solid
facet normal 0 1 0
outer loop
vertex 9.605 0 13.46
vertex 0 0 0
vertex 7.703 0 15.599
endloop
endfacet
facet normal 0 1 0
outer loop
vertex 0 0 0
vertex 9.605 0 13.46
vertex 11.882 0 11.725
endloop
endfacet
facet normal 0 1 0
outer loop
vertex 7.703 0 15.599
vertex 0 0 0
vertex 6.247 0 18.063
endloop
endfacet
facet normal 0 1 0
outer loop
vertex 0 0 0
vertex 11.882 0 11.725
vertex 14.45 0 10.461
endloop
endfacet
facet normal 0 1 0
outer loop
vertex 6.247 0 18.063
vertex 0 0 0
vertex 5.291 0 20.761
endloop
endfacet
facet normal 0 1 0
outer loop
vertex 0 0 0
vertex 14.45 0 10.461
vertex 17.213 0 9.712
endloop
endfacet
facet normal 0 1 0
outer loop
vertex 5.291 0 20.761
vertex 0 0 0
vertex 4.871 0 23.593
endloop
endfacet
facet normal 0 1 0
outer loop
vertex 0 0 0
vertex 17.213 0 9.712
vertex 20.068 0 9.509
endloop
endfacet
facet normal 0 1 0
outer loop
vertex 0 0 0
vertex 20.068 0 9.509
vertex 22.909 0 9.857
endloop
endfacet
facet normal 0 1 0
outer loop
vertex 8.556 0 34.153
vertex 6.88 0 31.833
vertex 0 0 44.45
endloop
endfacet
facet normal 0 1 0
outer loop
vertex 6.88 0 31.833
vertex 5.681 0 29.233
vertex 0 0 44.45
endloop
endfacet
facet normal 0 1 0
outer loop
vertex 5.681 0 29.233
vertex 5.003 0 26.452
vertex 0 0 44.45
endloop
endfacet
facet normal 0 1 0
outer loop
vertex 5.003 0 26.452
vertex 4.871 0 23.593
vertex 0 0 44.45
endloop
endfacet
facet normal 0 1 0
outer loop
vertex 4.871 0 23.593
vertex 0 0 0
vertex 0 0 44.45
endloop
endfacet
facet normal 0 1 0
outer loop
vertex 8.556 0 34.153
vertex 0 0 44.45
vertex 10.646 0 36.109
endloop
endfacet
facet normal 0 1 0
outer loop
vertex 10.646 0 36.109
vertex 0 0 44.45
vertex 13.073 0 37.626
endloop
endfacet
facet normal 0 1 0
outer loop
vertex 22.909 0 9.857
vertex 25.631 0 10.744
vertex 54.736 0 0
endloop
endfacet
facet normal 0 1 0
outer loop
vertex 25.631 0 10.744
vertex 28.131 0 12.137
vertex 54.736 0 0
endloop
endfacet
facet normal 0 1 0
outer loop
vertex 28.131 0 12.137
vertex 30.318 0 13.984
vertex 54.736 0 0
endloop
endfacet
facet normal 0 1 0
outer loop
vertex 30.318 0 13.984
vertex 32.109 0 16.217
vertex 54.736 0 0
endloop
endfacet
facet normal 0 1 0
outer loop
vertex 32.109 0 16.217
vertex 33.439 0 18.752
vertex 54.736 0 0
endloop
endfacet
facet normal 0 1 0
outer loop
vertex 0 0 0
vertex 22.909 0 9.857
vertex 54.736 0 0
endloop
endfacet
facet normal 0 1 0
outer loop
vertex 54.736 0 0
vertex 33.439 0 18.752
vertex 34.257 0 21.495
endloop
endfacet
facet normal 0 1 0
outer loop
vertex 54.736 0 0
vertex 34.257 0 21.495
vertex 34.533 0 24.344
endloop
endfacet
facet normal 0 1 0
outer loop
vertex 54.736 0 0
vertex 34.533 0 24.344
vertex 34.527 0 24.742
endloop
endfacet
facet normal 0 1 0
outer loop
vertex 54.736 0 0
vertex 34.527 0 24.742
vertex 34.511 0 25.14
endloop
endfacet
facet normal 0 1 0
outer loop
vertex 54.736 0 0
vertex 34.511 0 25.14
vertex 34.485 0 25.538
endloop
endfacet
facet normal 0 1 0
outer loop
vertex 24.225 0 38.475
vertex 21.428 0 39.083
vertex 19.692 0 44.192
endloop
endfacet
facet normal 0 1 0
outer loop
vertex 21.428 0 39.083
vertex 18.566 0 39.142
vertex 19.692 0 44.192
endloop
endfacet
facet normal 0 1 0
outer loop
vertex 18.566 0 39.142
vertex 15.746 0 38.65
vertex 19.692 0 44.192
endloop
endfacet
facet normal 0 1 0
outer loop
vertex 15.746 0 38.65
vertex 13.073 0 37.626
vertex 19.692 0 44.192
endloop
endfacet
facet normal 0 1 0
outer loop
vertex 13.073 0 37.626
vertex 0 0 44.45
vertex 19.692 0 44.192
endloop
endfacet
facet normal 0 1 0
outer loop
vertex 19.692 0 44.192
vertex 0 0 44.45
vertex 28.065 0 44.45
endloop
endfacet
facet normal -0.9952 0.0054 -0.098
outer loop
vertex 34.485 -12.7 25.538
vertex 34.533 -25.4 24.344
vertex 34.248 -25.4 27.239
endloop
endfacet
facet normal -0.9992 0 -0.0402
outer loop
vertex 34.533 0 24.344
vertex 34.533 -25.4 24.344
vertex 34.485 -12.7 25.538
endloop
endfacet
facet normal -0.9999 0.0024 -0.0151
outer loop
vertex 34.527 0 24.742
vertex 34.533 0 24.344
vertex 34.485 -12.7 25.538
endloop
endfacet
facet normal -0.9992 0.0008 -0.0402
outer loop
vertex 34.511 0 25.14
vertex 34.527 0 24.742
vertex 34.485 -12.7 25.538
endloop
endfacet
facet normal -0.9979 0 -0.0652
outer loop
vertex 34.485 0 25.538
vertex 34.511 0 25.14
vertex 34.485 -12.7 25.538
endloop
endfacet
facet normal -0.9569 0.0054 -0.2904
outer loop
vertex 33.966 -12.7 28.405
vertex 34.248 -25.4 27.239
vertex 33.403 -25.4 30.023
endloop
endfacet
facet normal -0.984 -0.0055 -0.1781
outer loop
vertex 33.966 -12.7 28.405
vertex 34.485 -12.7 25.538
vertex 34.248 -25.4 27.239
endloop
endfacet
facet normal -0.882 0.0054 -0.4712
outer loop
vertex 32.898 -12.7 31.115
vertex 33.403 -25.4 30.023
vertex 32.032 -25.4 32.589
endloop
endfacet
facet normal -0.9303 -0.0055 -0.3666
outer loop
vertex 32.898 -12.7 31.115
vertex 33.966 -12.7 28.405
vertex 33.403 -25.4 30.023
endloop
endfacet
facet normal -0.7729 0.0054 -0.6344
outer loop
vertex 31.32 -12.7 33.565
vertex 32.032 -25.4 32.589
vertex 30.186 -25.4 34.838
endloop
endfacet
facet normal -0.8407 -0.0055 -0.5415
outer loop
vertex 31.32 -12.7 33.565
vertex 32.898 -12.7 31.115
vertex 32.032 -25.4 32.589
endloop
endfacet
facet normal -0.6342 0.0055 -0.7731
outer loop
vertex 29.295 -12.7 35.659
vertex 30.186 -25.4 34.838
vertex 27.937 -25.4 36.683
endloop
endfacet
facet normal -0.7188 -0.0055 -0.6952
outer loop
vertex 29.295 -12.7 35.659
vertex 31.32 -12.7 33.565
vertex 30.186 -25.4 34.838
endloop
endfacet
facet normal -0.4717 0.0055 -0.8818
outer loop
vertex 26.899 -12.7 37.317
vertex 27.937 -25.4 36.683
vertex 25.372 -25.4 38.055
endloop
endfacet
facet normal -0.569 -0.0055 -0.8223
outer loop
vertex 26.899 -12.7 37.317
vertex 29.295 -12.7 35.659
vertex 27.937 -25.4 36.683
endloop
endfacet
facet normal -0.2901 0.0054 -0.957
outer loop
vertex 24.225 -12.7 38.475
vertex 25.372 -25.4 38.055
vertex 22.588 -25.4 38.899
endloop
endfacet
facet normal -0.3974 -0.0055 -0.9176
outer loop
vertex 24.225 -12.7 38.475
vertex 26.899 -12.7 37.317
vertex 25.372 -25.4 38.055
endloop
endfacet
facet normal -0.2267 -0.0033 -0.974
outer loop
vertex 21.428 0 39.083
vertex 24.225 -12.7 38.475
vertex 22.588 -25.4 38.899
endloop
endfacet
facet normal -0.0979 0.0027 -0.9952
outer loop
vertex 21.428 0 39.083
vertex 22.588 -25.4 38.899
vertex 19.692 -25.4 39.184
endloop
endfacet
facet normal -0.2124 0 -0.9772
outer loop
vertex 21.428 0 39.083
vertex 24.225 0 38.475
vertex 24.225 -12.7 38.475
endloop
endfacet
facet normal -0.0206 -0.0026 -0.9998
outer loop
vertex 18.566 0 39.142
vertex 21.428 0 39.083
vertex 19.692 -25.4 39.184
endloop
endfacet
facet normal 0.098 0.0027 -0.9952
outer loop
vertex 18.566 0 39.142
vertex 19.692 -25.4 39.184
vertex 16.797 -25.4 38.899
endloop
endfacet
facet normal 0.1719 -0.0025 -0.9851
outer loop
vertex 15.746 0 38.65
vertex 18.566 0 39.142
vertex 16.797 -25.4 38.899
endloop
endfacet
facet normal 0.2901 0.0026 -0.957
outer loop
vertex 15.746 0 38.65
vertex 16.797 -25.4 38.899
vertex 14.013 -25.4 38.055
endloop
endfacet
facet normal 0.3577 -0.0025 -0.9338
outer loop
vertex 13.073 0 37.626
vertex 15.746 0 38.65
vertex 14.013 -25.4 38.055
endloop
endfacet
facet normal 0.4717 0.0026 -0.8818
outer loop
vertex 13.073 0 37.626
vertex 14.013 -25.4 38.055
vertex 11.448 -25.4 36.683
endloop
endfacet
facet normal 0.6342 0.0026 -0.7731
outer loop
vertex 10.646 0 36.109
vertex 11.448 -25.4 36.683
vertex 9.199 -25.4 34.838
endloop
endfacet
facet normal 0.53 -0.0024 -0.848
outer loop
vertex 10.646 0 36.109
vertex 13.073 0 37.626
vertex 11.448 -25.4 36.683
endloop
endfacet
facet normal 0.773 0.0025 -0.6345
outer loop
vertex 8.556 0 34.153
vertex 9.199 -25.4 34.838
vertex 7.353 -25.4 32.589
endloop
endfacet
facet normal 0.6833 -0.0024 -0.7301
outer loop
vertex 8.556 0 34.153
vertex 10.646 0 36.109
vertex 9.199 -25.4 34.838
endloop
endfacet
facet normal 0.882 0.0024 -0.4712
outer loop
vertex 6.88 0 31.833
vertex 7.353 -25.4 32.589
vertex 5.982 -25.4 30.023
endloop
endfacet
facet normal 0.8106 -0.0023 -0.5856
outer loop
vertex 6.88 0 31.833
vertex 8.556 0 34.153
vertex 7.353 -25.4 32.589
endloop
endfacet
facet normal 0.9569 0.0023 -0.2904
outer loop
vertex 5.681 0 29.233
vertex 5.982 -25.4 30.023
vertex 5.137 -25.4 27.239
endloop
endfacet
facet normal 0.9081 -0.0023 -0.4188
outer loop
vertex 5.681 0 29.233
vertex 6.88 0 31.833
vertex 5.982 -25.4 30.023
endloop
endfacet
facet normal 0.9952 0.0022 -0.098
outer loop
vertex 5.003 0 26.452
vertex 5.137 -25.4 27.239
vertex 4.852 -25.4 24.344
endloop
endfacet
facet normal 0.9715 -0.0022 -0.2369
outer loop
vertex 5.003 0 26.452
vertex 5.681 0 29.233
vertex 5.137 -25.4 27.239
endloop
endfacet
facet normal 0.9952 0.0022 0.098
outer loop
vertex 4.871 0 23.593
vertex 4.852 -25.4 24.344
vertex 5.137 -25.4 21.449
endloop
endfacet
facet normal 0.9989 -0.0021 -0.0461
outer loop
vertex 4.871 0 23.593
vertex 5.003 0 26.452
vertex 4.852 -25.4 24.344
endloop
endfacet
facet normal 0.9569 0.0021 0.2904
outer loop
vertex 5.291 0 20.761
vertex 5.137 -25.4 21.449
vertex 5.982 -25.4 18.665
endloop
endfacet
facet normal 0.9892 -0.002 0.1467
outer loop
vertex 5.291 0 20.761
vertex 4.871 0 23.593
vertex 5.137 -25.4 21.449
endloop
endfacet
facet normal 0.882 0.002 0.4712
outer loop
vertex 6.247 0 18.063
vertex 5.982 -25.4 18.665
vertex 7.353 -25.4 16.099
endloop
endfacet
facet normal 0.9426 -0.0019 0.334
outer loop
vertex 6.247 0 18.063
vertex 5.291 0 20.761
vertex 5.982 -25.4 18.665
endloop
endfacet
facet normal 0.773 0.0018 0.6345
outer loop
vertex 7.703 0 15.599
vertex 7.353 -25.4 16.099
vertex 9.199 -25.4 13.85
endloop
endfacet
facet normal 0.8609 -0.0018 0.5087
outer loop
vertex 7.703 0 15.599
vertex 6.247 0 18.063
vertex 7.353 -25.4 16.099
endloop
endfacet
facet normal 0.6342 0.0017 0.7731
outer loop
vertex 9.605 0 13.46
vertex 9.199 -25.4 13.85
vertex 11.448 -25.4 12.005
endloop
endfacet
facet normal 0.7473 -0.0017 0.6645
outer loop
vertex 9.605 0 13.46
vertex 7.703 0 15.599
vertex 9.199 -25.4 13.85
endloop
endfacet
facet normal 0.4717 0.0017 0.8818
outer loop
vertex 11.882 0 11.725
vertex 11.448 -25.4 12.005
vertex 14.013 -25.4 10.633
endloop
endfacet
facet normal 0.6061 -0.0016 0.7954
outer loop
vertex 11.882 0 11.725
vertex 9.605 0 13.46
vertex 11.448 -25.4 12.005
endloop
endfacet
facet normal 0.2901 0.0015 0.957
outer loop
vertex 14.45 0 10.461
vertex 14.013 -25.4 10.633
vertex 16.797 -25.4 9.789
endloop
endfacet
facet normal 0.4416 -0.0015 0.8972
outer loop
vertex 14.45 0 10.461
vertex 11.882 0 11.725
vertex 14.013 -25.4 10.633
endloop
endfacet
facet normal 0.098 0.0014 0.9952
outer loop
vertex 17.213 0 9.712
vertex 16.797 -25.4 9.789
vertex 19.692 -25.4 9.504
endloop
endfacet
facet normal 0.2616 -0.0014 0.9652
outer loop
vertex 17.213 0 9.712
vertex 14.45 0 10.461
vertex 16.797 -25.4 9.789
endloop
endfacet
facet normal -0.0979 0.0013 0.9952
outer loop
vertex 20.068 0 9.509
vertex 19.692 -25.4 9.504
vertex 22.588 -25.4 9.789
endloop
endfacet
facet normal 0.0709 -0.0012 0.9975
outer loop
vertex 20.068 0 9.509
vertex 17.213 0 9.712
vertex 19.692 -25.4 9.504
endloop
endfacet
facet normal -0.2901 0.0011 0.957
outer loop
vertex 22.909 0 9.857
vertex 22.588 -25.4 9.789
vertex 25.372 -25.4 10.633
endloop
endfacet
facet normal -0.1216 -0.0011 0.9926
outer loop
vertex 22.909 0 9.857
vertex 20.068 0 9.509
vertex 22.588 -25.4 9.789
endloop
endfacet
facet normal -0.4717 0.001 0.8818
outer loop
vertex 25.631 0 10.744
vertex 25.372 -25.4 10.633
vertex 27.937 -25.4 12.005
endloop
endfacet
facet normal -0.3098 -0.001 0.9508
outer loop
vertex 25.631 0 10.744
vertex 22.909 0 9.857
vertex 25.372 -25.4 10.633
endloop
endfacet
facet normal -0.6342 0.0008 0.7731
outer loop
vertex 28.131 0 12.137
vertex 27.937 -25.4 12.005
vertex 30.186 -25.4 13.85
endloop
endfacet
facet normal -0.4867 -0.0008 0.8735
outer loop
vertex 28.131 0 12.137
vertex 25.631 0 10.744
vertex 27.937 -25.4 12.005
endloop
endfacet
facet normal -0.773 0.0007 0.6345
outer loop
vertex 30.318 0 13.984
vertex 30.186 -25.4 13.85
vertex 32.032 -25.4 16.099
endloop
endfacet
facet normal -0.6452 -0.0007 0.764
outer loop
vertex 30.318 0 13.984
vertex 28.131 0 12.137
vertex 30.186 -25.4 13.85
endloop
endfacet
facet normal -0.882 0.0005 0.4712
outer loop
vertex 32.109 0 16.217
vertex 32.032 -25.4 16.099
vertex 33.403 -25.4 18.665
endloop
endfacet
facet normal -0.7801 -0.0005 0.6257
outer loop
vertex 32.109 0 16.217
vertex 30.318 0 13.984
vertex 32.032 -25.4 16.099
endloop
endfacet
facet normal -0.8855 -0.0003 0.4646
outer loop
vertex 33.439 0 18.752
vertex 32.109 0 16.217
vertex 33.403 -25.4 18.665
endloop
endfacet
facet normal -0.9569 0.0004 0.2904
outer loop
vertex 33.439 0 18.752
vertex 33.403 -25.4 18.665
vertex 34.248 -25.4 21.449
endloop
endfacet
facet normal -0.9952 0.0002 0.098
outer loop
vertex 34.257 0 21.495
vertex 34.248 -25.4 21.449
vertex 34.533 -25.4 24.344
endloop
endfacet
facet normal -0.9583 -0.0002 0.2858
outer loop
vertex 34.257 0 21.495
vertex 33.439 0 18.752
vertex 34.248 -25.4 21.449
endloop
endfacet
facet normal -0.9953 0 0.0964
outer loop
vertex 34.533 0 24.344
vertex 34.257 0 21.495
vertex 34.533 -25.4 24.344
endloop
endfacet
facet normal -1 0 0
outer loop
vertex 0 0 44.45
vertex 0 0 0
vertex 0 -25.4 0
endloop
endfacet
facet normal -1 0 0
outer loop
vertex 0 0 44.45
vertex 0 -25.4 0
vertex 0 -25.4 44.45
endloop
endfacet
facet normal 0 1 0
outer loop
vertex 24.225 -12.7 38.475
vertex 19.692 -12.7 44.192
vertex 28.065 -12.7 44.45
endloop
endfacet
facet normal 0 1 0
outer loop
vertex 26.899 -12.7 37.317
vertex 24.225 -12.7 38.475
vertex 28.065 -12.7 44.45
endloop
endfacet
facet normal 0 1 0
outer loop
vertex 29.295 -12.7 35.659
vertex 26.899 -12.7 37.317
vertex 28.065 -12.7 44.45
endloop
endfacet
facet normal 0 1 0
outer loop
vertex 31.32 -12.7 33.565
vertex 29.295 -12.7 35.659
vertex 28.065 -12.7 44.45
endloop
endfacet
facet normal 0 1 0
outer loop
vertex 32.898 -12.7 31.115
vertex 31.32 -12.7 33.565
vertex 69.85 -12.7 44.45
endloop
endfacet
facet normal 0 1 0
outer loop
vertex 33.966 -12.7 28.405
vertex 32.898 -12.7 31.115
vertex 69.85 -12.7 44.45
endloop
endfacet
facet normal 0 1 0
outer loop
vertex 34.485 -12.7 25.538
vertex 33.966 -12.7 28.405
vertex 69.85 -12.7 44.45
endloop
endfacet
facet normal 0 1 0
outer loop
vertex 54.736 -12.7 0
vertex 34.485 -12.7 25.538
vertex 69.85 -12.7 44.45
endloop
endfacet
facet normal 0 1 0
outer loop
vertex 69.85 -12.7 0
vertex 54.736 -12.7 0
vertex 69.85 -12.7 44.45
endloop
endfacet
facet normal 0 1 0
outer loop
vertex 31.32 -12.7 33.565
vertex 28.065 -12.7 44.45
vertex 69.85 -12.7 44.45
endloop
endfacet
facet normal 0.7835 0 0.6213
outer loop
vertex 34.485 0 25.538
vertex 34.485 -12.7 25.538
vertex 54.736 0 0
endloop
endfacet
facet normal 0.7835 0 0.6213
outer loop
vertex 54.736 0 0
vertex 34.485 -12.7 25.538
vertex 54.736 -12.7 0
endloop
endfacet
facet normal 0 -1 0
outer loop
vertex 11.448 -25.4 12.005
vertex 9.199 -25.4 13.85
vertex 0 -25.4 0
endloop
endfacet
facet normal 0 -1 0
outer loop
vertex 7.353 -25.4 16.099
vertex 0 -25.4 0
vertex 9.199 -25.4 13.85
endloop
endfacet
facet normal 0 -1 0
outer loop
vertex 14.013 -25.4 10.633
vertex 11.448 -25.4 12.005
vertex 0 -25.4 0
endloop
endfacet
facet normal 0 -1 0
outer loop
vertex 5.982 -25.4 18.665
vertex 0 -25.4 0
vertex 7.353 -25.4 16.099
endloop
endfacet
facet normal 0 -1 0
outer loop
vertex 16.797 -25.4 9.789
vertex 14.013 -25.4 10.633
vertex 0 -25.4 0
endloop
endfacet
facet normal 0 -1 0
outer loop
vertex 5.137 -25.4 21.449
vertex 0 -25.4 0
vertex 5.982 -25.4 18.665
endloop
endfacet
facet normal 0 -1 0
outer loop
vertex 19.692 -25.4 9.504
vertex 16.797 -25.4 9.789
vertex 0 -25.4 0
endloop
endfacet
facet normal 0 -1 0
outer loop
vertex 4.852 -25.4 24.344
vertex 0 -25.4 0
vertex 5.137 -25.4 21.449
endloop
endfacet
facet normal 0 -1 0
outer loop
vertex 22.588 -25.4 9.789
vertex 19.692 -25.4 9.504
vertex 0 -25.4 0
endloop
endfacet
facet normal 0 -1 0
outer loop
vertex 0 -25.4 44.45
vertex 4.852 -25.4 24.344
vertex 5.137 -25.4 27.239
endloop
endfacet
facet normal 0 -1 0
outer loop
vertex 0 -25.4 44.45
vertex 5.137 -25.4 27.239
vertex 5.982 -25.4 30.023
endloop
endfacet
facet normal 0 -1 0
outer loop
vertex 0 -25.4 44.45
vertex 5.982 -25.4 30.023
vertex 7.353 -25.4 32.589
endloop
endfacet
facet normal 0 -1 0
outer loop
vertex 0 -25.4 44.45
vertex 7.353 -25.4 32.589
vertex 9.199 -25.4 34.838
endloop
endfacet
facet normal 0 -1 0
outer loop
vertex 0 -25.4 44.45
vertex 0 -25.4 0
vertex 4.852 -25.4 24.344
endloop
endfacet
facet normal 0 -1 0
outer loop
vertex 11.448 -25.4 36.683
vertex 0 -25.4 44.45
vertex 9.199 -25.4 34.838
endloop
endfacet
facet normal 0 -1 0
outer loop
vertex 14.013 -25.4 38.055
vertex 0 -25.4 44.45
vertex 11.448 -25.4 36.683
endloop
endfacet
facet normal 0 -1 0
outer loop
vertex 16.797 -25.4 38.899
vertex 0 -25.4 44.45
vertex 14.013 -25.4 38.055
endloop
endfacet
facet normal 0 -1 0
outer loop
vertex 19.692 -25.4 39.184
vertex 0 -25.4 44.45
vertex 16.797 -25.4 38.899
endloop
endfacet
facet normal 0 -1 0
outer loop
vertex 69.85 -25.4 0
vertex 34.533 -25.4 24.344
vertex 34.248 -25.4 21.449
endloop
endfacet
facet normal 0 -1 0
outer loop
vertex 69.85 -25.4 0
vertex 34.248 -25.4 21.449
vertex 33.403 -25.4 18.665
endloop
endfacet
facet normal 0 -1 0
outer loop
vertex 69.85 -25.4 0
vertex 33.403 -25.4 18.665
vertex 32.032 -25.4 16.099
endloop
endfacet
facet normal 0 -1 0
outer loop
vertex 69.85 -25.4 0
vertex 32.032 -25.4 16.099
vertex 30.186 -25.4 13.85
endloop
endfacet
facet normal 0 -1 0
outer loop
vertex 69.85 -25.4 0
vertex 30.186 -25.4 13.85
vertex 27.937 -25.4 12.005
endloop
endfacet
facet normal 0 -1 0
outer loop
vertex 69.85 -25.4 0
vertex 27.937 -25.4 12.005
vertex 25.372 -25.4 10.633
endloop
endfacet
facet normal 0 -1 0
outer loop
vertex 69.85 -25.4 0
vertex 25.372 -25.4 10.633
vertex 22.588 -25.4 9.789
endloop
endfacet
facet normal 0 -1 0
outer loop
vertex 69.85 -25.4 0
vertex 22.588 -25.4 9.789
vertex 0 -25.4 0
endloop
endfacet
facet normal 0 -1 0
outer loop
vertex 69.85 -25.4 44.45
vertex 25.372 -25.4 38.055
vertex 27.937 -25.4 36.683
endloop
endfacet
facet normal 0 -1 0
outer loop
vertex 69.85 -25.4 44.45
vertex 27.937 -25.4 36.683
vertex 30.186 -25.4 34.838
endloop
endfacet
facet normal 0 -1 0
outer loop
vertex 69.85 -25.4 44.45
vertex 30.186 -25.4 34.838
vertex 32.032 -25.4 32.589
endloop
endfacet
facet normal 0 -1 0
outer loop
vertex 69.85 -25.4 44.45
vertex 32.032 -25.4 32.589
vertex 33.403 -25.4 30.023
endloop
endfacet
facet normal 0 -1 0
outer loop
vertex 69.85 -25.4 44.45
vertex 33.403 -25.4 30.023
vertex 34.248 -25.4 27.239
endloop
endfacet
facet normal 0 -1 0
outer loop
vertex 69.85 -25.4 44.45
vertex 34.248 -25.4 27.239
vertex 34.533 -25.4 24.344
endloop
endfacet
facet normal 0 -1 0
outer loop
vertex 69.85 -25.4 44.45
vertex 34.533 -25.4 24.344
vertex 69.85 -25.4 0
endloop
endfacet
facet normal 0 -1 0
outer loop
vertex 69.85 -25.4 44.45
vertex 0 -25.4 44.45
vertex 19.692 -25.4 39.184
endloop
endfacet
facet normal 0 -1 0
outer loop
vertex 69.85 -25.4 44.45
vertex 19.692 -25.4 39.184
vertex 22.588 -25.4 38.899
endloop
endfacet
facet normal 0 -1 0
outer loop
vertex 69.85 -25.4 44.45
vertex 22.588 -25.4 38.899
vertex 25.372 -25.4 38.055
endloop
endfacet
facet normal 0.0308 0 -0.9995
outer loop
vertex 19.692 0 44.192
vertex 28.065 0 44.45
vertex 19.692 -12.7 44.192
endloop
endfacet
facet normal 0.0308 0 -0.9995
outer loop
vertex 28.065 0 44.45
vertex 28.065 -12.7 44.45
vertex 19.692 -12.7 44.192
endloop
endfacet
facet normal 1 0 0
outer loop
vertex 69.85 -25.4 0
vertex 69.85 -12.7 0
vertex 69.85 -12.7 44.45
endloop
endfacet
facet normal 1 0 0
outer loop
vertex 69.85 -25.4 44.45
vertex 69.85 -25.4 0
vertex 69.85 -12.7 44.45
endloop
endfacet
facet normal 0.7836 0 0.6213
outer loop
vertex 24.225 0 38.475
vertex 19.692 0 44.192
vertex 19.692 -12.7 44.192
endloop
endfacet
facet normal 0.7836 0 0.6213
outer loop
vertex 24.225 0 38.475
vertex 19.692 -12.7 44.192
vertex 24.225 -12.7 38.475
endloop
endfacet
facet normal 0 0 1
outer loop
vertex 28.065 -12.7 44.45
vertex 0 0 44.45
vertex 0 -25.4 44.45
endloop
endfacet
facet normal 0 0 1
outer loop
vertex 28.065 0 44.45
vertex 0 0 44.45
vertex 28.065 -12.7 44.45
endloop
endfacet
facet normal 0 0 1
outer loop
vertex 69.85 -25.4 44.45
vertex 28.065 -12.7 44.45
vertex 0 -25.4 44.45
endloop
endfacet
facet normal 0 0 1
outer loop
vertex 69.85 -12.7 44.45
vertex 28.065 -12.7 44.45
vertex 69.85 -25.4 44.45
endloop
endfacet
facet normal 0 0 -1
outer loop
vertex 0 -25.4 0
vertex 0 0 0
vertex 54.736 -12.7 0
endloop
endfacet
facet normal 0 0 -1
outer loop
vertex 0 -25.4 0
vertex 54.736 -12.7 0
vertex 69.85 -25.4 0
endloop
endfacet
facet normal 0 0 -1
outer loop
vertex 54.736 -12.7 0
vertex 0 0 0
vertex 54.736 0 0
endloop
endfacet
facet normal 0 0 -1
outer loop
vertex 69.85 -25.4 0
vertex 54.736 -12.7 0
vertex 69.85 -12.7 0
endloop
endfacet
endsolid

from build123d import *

# Parameters (mm, degrees)
F0_W     = 69.85
F0_H     = 44.45
F1_DEPTH = 25.4
F3_DEPTH = 12.7
F4_R     = 14.840288
F5_DEPTH = 25.401


with BuildPart() as f1:
    # F0 (on Front) → F1 (new body)
    with BuildSketch(Plane.XZ):
        with Locations((34.925, 22.225)):
            Rectangle(F0_W, F0_H)
    extrude(amount=F1_DEPTH)

    # F2 (on Front) → F3 (cut, symmetric)
    with BuildSketch(Plane.XZ):
        Polygon((69.931224, 45.74215), (19.692384, 44.191573), (54.735523, 0), (69.931224, 0), align=None)
    extrude(amount=F3_DEPTH, both=True, mode=Mode.SUBTRACT)

    # F4 (on Front) → F5 (cut, through all)
    with BuildSketch(Plane.XZ):
        with Locations((19.692384, 24.344128)):
            Circle(F4_R)
    extrude(amount=F5_DEPTH, mode=Mode.SUBTRACT)


solid = f1.part
